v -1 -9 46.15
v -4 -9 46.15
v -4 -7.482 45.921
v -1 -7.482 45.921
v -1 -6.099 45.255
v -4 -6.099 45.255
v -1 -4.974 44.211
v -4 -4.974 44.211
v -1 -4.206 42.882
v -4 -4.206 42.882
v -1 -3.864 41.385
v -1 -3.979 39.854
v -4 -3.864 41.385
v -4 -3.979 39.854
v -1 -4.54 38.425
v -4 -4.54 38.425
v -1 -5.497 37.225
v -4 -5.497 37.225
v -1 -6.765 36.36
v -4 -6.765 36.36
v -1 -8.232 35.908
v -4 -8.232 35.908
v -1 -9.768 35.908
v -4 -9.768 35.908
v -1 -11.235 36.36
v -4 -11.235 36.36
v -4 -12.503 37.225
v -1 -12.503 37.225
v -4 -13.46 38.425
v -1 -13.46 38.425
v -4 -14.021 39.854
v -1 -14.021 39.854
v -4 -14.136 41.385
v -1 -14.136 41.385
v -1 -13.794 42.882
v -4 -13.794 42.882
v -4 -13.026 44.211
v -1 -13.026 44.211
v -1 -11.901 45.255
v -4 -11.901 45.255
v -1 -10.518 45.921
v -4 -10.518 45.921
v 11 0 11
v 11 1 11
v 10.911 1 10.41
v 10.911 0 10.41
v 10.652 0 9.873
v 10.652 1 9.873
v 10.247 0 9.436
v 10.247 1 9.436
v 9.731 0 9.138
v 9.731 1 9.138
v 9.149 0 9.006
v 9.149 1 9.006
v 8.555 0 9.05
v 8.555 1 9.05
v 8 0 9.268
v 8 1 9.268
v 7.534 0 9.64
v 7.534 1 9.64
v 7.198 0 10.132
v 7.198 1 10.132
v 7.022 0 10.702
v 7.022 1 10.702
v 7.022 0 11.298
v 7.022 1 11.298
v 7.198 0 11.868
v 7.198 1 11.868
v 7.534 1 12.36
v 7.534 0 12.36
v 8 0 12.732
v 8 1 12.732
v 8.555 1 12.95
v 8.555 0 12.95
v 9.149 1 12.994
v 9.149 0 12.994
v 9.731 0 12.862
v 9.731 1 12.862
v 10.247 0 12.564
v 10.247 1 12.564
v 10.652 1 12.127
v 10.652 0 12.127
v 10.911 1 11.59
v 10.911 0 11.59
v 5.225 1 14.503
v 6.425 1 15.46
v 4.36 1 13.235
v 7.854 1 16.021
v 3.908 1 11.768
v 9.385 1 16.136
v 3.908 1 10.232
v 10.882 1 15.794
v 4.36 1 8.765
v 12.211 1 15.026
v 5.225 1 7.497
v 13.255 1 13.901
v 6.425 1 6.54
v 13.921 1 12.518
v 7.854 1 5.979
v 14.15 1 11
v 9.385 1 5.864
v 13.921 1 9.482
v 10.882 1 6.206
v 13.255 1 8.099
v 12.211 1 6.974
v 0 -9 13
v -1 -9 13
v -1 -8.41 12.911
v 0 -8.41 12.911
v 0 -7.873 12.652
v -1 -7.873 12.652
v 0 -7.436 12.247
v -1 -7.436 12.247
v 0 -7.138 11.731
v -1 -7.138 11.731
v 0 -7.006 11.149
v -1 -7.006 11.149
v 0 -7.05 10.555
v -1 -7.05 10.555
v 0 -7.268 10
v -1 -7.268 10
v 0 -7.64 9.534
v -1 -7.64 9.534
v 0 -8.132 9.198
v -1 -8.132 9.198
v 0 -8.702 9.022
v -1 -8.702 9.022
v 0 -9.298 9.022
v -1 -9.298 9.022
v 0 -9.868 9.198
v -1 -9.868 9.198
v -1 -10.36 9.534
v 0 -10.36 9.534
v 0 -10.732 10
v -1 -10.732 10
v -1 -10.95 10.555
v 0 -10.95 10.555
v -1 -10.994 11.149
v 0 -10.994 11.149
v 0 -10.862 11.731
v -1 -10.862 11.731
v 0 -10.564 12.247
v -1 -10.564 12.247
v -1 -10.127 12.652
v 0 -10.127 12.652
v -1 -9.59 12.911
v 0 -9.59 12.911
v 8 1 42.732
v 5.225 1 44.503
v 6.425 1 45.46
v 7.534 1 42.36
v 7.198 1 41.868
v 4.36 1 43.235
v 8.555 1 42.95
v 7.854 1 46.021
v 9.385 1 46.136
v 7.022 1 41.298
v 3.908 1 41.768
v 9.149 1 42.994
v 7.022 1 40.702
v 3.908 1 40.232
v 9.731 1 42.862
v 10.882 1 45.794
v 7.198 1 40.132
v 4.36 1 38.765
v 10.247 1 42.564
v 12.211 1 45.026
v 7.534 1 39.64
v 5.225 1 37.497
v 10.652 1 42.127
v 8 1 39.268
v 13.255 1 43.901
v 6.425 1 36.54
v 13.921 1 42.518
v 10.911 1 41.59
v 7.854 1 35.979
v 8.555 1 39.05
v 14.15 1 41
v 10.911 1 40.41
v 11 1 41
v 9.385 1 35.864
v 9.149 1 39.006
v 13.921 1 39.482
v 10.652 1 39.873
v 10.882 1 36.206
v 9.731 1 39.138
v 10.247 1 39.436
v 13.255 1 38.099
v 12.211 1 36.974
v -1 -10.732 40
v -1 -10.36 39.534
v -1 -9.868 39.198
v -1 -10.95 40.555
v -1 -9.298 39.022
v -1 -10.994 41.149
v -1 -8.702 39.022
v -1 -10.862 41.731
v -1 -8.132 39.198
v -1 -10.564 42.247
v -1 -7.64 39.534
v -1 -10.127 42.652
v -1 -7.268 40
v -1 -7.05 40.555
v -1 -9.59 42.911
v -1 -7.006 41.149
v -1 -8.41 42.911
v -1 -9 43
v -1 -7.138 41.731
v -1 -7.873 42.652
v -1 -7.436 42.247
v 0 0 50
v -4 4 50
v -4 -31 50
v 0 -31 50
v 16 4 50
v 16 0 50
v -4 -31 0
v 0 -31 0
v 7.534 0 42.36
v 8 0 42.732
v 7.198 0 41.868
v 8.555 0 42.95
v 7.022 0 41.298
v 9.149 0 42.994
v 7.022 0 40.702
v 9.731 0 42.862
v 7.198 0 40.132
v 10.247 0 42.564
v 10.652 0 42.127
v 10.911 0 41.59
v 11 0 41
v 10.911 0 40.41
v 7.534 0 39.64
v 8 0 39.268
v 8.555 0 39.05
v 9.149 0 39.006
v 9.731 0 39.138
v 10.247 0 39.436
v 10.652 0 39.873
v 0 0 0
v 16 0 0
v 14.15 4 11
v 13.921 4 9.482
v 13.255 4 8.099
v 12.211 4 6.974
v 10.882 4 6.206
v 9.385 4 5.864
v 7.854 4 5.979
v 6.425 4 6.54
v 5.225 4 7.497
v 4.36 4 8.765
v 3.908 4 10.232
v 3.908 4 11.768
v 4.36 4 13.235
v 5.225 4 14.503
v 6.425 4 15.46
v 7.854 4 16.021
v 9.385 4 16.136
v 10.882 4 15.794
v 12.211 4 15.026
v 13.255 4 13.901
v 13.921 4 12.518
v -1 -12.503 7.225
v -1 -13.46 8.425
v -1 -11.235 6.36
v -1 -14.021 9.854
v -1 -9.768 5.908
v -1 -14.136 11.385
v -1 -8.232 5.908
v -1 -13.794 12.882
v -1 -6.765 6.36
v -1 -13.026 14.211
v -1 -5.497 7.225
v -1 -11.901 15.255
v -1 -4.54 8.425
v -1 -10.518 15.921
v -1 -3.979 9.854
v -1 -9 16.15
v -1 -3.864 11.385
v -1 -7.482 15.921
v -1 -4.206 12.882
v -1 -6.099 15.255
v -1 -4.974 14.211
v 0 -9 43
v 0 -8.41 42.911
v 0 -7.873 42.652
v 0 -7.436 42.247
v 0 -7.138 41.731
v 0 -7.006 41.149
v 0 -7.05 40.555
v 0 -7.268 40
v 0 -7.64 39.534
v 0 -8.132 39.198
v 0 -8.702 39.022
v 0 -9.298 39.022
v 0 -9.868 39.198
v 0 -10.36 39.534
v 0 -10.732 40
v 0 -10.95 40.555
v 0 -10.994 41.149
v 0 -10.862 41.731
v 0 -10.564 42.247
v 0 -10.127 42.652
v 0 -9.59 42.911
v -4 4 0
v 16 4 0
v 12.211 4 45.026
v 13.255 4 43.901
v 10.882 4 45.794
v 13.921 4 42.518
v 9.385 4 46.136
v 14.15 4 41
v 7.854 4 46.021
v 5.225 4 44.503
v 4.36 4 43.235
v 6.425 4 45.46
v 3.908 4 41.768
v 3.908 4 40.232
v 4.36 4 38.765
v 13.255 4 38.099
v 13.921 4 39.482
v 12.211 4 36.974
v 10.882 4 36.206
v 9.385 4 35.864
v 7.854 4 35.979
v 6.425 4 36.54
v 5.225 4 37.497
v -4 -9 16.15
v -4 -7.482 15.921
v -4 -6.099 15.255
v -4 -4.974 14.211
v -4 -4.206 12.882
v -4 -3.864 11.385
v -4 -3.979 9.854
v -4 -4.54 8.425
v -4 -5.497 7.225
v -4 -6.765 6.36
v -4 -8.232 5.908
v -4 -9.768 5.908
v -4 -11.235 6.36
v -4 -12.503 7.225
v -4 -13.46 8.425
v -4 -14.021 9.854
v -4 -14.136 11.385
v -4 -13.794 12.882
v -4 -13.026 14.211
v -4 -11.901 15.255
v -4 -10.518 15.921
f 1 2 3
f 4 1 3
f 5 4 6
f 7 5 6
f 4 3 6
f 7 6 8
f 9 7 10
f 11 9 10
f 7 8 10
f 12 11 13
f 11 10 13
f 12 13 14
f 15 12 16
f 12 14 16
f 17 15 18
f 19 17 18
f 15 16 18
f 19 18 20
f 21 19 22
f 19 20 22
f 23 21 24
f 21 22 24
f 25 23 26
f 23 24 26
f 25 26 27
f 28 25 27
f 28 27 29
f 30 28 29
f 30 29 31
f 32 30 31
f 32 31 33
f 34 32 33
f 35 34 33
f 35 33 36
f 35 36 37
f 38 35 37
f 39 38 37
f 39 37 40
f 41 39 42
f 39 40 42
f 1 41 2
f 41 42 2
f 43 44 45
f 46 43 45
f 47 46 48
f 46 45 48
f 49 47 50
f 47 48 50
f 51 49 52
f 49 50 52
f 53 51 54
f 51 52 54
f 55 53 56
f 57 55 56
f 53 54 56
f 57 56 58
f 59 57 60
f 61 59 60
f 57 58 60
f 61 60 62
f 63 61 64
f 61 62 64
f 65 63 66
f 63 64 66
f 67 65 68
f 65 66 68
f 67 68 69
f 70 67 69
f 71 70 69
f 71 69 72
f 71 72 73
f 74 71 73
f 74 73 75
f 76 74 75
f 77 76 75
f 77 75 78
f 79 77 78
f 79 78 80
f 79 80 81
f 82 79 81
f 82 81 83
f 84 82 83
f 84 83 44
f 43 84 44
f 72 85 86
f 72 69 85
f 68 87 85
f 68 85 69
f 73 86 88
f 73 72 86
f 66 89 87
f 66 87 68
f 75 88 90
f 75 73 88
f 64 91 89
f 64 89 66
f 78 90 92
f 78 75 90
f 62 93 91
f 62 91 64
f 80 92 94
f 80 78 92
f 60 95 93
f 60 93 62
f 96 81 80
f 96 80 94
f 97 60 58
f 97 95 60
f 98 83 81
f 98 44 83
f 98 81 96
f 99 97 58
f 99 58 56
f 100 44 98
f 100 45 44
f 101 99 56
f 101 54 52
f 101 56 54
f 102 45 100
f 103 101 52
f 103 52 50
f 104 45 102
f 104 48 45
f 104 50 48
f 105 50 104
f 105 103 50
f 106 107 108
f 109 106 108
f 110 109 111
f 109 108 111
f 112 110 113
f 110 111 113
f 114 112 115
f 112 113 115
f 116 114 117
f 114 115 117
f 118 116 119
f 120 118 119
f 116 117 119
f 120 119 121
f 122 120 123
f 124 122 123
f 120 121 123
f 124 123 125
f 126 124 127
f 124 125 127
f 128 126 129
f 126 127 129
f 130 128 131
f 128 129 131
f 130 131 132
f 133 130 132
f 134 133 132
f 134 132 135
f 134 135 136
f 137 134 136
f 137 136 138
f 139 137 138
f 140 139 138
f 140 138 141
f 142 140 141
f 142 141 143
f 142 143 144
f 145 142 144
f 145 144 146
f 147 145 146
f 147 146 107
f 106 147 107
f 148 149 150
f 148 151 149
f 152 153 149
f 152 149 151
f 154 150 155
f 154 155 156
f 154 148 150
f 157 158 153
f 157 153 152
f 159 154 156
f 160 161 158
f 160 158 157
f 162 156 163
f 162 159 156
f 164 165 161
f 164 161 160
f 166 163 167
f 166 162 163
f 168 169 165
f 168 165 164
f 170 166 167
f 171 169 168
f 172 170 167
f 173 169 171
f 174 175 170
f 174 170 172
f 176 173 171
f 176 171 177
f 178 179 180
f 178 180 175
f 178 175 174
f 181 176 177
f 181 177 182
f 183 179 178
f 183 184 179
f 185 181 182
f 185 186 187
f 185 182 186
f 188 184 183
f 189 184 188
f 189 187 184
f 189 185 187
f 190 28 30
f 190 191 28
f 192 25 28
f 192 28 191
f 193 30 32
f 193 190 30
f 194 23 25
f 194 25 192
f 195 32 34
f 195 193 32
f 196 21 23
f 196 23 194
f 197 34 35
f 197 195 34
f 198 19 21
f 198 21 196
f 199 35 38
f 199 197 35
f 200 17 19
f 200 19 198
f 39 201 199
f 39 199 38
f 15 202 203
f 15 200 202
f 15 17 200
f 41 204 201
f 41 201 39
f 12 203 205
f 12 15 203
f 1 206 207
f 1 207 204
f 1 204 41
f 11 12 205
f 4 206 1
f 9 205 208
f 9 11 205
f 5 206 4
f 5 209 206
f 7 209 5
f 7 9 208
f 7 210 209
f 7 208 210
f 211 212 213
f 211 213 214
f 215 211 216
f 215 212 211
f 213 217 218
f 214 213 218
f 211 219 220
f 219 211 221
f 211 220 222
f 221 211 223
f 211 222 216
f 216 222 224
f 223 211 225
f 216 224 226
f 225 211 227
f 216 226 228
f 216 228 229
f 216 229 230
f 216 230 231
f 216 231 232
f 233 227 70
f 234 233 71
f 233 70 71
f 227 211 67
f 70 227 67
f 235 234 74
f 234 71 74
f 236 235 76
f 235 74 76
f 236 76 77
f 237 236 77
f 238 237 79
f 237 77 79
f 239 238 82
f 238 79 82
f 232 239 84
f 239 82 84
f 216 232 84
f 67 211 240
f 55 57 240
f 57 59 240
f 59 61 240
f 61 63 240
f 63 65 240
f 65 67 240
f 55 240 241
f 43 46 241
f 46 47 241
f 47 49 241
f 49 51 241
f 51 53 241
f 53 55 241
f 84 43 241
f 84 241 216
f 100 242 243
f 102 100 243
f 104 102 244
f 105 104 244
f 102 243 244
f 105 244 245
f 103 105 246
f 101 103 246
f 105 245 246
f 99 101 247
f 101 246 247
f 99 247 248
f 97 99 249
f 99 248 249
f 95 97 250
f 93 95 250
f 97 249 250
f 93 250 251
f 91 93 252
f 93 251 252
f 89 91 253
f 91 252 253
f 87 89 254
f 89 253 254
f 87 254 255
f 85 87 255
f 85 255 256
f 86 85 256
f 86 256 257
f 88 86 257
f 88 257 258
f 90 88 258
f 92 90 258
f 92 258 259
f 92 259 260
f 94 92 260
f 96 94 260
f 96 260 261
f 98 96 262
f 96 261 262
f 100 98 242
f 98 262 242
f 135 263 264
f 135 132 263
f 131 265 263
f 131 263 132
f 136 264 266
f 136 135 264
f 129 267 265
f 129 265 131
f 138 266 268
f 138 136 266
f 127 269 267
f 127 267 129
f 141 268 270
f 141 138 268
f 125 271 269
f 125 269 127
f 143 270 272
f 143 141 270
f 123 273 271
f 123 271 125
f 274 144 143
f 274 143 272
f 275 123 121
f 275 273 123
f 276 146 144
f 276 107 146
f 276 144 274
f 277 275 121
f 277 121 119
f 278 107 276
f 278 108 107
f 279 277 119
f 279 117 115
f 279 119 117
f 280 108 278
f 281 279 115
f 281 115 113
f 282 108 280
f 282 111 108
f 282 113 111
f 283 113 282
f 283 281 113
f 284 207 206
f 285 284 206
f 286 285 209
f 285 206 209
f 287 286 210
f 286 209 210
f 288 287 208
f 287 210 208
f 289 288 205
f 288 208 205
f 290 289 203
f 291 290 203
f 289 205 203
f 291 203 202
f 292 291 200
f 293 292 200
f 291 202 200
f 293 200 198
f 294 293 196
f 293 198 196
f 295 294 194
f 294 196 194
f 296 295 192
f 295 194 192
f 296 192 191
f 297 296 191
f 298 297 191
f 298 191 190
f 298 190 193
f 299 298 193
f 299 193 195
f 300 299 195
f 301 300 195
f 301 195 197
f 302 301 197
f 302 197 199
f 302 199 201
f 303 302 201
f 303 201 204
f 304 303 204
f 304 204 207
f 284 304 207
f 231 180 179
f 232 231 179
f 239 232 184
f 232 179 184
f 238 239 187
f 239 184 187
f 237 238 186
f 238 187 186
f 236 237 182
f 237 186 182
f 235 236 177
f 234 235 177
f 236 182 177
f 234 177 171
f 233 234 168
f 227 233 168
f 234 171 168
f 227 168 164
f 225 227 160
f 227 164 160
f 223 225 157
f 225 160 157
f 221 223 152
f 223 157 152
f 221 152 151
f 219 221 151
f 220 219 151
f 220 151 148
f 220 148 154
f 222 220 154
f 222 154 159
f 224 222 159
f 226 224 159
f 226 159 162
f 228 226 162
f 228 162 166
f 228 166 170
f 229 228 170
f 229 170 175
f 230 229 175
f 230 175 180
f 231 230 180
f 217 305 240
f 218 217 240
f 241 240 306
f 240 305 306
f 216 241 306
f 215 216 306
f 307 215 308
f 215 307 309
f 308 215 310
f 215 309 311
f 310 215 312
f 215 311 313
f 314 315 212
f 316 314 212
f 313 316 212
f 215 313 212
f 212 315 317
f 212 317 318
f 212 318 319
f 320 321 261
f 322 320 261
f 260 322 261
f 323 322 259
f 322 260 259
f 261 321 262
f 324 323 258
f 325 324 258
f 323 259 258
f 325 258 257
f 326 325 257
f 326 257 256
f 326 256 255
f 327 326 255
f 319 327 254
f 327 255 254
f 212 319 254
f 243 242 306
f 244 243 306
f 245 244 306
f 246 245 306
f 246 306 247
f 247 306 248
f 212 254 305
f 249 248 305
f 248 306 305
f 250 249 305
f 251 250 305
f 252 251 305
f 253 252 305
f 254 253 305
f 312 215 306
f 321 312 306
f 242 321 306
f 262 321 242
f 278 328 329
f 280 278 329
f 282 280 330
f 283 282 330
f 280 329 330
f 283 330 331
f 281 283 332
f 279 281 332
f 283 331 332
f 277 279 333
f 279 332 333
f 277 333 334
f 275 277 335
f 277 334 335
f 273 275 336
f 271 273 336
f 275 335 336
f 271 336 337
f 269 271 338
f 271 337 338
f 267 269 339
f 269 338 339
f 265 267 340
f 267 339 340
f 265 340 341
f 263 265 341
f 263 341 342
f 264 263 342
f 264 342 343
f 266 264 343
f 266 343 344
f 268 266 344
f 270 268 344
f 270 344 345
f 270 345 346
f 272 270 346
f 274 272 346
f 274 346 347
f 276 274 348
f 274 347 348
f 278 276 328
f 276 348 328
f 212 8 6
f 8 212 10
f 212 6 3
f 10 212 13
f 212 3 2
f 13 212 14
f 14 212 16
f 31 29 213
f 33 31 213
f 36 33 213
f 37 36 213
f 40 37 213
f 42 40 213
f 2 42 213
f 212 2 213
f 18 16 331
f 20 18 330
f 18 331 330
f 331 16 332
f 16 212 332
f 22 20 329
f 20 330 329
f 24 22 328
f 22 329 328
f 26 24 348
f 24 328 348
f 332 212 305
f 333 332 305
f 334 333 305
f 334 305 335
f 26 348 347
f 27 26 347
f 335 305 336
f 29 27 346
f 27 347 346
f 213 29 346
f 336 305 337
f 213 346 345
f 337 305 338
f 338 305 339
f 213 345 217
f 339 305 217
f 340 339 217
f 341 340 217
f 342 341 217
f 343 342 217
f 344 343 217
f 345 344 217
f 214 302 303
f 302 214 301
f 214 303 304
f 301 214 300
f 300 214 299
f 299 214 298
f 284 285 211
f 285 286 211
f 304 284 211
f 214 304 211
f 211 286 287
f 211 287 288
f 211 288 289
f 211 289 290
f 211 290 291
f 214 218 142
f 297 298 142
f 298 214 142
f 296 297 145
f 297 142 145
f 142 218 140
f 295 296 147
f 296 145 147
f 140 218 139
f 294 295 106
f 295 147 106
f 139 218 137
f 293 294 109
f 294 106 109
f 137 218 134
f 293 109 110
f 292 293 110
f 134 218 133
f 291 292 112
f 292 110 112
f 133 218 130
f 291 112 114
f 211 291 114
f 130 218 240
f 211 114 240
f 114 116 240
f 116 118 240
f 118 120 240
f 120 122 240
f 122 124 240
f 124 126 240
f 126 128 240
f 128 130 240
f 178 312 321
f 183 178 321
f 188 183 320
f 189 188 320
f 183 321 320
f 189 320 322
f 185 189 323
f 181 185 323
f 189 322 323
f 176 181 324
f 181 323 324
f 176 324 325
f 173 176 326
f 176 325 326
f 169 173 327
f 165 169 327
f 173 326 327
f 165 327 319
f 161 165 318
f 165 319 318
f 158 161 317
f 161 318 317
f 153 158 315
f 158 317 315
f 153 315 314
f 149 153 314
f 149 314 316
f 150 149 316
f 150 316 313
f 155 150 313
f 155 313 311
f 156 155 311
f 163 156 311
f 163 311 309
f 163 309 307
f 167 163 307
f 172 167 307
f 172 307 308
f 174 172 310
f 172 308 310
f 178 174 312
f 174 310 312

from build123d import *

# Parameters (mm, degrees)
RESSALTO_EXTRUS_O1_DEPTH = 50
ESBO_O2_R                = 5.15
CORTE_EXTRUS_O1_DEPTH    = 3
ESBO_O3_R                = 5.15
CORTE_EXTRUS_O2_DEPTH    = 3
ESBO_O4_R                = 2
CORTE_EXTRUS_O3_DEPTH    = 10
ESBO_O5_R                = 2
CORTE_EXTRUS_O4_DEPTH    = 10


with BuildPart() as part:
    # Esboço1 → Ressalto-extrusão1 (new body)
    with BuildSketch(Plane.XY):
        Polygon((0, 0), (16, 0), (16, 4), (-4, 4), (-4, -31), (0, -31), align=None)
    extrude(amount=RESSALTO_EXTRUS_O1_DEPTH)

    # Esboço2 → Corte-extrusão1 (cut)
    with BuildSketch(Plane(origin=(0, 4, 0), x_dir=(1, 0, 0), z_dir=(0, 1, 0))):
        with Locations((9, -11)):
            Circle(ESBO_O2_R)
        with Locations((9, -41)):
            Circle(ESBO_O2_R)
    extrude(amount=-CORTE_EXTRUS_O1_DEPTH, mode=Mode.SUBTRACT)

    # Esboço3 → Corte-extrusão2 (cut)
    with BuildSketch(Plane.ZY.offset(4)):
        with Locations((11, -9)):
            Circle(ESBO_O3_R)
        with Locations((41, -9)):
            Circle(ESBO_O3_R)
    extrude(amount=-CORTE_EXTRUS_O2_DEPTH, mode=Mode.SUBTRACT)

    # Esboço4 → Corte-extrusão3 (cut)
    with BuildSketch(Plane.ZY.offset(1)):
        with Locations((11, -9)):
            Circle(ESBO_O4_R)
        with Locations((41, -9)):
            Circle(ESBO_O4_R)
    extrude(amount=-CORTE_EXTRUS_O3_DEPTH, mode=Mode.SUBTRACT)

    # Esboço5 → Corte-extrusão4 (cut)
    with BuildSketch(Plane(origin=(0, 1, 0), x_dir=(1, 0, 0), z_dir=(0, 1, 0))):
        with Locations((9, -11)):
            Circle(ESBO_O5_R)
        with Locations((9, -41)):
            Circle(ESBO_O5_R)
    extrude(amount=-CORTE_EXTRUS_O4_DEPTH, mode=Mode.SUBTRACT)


solid = part.part
